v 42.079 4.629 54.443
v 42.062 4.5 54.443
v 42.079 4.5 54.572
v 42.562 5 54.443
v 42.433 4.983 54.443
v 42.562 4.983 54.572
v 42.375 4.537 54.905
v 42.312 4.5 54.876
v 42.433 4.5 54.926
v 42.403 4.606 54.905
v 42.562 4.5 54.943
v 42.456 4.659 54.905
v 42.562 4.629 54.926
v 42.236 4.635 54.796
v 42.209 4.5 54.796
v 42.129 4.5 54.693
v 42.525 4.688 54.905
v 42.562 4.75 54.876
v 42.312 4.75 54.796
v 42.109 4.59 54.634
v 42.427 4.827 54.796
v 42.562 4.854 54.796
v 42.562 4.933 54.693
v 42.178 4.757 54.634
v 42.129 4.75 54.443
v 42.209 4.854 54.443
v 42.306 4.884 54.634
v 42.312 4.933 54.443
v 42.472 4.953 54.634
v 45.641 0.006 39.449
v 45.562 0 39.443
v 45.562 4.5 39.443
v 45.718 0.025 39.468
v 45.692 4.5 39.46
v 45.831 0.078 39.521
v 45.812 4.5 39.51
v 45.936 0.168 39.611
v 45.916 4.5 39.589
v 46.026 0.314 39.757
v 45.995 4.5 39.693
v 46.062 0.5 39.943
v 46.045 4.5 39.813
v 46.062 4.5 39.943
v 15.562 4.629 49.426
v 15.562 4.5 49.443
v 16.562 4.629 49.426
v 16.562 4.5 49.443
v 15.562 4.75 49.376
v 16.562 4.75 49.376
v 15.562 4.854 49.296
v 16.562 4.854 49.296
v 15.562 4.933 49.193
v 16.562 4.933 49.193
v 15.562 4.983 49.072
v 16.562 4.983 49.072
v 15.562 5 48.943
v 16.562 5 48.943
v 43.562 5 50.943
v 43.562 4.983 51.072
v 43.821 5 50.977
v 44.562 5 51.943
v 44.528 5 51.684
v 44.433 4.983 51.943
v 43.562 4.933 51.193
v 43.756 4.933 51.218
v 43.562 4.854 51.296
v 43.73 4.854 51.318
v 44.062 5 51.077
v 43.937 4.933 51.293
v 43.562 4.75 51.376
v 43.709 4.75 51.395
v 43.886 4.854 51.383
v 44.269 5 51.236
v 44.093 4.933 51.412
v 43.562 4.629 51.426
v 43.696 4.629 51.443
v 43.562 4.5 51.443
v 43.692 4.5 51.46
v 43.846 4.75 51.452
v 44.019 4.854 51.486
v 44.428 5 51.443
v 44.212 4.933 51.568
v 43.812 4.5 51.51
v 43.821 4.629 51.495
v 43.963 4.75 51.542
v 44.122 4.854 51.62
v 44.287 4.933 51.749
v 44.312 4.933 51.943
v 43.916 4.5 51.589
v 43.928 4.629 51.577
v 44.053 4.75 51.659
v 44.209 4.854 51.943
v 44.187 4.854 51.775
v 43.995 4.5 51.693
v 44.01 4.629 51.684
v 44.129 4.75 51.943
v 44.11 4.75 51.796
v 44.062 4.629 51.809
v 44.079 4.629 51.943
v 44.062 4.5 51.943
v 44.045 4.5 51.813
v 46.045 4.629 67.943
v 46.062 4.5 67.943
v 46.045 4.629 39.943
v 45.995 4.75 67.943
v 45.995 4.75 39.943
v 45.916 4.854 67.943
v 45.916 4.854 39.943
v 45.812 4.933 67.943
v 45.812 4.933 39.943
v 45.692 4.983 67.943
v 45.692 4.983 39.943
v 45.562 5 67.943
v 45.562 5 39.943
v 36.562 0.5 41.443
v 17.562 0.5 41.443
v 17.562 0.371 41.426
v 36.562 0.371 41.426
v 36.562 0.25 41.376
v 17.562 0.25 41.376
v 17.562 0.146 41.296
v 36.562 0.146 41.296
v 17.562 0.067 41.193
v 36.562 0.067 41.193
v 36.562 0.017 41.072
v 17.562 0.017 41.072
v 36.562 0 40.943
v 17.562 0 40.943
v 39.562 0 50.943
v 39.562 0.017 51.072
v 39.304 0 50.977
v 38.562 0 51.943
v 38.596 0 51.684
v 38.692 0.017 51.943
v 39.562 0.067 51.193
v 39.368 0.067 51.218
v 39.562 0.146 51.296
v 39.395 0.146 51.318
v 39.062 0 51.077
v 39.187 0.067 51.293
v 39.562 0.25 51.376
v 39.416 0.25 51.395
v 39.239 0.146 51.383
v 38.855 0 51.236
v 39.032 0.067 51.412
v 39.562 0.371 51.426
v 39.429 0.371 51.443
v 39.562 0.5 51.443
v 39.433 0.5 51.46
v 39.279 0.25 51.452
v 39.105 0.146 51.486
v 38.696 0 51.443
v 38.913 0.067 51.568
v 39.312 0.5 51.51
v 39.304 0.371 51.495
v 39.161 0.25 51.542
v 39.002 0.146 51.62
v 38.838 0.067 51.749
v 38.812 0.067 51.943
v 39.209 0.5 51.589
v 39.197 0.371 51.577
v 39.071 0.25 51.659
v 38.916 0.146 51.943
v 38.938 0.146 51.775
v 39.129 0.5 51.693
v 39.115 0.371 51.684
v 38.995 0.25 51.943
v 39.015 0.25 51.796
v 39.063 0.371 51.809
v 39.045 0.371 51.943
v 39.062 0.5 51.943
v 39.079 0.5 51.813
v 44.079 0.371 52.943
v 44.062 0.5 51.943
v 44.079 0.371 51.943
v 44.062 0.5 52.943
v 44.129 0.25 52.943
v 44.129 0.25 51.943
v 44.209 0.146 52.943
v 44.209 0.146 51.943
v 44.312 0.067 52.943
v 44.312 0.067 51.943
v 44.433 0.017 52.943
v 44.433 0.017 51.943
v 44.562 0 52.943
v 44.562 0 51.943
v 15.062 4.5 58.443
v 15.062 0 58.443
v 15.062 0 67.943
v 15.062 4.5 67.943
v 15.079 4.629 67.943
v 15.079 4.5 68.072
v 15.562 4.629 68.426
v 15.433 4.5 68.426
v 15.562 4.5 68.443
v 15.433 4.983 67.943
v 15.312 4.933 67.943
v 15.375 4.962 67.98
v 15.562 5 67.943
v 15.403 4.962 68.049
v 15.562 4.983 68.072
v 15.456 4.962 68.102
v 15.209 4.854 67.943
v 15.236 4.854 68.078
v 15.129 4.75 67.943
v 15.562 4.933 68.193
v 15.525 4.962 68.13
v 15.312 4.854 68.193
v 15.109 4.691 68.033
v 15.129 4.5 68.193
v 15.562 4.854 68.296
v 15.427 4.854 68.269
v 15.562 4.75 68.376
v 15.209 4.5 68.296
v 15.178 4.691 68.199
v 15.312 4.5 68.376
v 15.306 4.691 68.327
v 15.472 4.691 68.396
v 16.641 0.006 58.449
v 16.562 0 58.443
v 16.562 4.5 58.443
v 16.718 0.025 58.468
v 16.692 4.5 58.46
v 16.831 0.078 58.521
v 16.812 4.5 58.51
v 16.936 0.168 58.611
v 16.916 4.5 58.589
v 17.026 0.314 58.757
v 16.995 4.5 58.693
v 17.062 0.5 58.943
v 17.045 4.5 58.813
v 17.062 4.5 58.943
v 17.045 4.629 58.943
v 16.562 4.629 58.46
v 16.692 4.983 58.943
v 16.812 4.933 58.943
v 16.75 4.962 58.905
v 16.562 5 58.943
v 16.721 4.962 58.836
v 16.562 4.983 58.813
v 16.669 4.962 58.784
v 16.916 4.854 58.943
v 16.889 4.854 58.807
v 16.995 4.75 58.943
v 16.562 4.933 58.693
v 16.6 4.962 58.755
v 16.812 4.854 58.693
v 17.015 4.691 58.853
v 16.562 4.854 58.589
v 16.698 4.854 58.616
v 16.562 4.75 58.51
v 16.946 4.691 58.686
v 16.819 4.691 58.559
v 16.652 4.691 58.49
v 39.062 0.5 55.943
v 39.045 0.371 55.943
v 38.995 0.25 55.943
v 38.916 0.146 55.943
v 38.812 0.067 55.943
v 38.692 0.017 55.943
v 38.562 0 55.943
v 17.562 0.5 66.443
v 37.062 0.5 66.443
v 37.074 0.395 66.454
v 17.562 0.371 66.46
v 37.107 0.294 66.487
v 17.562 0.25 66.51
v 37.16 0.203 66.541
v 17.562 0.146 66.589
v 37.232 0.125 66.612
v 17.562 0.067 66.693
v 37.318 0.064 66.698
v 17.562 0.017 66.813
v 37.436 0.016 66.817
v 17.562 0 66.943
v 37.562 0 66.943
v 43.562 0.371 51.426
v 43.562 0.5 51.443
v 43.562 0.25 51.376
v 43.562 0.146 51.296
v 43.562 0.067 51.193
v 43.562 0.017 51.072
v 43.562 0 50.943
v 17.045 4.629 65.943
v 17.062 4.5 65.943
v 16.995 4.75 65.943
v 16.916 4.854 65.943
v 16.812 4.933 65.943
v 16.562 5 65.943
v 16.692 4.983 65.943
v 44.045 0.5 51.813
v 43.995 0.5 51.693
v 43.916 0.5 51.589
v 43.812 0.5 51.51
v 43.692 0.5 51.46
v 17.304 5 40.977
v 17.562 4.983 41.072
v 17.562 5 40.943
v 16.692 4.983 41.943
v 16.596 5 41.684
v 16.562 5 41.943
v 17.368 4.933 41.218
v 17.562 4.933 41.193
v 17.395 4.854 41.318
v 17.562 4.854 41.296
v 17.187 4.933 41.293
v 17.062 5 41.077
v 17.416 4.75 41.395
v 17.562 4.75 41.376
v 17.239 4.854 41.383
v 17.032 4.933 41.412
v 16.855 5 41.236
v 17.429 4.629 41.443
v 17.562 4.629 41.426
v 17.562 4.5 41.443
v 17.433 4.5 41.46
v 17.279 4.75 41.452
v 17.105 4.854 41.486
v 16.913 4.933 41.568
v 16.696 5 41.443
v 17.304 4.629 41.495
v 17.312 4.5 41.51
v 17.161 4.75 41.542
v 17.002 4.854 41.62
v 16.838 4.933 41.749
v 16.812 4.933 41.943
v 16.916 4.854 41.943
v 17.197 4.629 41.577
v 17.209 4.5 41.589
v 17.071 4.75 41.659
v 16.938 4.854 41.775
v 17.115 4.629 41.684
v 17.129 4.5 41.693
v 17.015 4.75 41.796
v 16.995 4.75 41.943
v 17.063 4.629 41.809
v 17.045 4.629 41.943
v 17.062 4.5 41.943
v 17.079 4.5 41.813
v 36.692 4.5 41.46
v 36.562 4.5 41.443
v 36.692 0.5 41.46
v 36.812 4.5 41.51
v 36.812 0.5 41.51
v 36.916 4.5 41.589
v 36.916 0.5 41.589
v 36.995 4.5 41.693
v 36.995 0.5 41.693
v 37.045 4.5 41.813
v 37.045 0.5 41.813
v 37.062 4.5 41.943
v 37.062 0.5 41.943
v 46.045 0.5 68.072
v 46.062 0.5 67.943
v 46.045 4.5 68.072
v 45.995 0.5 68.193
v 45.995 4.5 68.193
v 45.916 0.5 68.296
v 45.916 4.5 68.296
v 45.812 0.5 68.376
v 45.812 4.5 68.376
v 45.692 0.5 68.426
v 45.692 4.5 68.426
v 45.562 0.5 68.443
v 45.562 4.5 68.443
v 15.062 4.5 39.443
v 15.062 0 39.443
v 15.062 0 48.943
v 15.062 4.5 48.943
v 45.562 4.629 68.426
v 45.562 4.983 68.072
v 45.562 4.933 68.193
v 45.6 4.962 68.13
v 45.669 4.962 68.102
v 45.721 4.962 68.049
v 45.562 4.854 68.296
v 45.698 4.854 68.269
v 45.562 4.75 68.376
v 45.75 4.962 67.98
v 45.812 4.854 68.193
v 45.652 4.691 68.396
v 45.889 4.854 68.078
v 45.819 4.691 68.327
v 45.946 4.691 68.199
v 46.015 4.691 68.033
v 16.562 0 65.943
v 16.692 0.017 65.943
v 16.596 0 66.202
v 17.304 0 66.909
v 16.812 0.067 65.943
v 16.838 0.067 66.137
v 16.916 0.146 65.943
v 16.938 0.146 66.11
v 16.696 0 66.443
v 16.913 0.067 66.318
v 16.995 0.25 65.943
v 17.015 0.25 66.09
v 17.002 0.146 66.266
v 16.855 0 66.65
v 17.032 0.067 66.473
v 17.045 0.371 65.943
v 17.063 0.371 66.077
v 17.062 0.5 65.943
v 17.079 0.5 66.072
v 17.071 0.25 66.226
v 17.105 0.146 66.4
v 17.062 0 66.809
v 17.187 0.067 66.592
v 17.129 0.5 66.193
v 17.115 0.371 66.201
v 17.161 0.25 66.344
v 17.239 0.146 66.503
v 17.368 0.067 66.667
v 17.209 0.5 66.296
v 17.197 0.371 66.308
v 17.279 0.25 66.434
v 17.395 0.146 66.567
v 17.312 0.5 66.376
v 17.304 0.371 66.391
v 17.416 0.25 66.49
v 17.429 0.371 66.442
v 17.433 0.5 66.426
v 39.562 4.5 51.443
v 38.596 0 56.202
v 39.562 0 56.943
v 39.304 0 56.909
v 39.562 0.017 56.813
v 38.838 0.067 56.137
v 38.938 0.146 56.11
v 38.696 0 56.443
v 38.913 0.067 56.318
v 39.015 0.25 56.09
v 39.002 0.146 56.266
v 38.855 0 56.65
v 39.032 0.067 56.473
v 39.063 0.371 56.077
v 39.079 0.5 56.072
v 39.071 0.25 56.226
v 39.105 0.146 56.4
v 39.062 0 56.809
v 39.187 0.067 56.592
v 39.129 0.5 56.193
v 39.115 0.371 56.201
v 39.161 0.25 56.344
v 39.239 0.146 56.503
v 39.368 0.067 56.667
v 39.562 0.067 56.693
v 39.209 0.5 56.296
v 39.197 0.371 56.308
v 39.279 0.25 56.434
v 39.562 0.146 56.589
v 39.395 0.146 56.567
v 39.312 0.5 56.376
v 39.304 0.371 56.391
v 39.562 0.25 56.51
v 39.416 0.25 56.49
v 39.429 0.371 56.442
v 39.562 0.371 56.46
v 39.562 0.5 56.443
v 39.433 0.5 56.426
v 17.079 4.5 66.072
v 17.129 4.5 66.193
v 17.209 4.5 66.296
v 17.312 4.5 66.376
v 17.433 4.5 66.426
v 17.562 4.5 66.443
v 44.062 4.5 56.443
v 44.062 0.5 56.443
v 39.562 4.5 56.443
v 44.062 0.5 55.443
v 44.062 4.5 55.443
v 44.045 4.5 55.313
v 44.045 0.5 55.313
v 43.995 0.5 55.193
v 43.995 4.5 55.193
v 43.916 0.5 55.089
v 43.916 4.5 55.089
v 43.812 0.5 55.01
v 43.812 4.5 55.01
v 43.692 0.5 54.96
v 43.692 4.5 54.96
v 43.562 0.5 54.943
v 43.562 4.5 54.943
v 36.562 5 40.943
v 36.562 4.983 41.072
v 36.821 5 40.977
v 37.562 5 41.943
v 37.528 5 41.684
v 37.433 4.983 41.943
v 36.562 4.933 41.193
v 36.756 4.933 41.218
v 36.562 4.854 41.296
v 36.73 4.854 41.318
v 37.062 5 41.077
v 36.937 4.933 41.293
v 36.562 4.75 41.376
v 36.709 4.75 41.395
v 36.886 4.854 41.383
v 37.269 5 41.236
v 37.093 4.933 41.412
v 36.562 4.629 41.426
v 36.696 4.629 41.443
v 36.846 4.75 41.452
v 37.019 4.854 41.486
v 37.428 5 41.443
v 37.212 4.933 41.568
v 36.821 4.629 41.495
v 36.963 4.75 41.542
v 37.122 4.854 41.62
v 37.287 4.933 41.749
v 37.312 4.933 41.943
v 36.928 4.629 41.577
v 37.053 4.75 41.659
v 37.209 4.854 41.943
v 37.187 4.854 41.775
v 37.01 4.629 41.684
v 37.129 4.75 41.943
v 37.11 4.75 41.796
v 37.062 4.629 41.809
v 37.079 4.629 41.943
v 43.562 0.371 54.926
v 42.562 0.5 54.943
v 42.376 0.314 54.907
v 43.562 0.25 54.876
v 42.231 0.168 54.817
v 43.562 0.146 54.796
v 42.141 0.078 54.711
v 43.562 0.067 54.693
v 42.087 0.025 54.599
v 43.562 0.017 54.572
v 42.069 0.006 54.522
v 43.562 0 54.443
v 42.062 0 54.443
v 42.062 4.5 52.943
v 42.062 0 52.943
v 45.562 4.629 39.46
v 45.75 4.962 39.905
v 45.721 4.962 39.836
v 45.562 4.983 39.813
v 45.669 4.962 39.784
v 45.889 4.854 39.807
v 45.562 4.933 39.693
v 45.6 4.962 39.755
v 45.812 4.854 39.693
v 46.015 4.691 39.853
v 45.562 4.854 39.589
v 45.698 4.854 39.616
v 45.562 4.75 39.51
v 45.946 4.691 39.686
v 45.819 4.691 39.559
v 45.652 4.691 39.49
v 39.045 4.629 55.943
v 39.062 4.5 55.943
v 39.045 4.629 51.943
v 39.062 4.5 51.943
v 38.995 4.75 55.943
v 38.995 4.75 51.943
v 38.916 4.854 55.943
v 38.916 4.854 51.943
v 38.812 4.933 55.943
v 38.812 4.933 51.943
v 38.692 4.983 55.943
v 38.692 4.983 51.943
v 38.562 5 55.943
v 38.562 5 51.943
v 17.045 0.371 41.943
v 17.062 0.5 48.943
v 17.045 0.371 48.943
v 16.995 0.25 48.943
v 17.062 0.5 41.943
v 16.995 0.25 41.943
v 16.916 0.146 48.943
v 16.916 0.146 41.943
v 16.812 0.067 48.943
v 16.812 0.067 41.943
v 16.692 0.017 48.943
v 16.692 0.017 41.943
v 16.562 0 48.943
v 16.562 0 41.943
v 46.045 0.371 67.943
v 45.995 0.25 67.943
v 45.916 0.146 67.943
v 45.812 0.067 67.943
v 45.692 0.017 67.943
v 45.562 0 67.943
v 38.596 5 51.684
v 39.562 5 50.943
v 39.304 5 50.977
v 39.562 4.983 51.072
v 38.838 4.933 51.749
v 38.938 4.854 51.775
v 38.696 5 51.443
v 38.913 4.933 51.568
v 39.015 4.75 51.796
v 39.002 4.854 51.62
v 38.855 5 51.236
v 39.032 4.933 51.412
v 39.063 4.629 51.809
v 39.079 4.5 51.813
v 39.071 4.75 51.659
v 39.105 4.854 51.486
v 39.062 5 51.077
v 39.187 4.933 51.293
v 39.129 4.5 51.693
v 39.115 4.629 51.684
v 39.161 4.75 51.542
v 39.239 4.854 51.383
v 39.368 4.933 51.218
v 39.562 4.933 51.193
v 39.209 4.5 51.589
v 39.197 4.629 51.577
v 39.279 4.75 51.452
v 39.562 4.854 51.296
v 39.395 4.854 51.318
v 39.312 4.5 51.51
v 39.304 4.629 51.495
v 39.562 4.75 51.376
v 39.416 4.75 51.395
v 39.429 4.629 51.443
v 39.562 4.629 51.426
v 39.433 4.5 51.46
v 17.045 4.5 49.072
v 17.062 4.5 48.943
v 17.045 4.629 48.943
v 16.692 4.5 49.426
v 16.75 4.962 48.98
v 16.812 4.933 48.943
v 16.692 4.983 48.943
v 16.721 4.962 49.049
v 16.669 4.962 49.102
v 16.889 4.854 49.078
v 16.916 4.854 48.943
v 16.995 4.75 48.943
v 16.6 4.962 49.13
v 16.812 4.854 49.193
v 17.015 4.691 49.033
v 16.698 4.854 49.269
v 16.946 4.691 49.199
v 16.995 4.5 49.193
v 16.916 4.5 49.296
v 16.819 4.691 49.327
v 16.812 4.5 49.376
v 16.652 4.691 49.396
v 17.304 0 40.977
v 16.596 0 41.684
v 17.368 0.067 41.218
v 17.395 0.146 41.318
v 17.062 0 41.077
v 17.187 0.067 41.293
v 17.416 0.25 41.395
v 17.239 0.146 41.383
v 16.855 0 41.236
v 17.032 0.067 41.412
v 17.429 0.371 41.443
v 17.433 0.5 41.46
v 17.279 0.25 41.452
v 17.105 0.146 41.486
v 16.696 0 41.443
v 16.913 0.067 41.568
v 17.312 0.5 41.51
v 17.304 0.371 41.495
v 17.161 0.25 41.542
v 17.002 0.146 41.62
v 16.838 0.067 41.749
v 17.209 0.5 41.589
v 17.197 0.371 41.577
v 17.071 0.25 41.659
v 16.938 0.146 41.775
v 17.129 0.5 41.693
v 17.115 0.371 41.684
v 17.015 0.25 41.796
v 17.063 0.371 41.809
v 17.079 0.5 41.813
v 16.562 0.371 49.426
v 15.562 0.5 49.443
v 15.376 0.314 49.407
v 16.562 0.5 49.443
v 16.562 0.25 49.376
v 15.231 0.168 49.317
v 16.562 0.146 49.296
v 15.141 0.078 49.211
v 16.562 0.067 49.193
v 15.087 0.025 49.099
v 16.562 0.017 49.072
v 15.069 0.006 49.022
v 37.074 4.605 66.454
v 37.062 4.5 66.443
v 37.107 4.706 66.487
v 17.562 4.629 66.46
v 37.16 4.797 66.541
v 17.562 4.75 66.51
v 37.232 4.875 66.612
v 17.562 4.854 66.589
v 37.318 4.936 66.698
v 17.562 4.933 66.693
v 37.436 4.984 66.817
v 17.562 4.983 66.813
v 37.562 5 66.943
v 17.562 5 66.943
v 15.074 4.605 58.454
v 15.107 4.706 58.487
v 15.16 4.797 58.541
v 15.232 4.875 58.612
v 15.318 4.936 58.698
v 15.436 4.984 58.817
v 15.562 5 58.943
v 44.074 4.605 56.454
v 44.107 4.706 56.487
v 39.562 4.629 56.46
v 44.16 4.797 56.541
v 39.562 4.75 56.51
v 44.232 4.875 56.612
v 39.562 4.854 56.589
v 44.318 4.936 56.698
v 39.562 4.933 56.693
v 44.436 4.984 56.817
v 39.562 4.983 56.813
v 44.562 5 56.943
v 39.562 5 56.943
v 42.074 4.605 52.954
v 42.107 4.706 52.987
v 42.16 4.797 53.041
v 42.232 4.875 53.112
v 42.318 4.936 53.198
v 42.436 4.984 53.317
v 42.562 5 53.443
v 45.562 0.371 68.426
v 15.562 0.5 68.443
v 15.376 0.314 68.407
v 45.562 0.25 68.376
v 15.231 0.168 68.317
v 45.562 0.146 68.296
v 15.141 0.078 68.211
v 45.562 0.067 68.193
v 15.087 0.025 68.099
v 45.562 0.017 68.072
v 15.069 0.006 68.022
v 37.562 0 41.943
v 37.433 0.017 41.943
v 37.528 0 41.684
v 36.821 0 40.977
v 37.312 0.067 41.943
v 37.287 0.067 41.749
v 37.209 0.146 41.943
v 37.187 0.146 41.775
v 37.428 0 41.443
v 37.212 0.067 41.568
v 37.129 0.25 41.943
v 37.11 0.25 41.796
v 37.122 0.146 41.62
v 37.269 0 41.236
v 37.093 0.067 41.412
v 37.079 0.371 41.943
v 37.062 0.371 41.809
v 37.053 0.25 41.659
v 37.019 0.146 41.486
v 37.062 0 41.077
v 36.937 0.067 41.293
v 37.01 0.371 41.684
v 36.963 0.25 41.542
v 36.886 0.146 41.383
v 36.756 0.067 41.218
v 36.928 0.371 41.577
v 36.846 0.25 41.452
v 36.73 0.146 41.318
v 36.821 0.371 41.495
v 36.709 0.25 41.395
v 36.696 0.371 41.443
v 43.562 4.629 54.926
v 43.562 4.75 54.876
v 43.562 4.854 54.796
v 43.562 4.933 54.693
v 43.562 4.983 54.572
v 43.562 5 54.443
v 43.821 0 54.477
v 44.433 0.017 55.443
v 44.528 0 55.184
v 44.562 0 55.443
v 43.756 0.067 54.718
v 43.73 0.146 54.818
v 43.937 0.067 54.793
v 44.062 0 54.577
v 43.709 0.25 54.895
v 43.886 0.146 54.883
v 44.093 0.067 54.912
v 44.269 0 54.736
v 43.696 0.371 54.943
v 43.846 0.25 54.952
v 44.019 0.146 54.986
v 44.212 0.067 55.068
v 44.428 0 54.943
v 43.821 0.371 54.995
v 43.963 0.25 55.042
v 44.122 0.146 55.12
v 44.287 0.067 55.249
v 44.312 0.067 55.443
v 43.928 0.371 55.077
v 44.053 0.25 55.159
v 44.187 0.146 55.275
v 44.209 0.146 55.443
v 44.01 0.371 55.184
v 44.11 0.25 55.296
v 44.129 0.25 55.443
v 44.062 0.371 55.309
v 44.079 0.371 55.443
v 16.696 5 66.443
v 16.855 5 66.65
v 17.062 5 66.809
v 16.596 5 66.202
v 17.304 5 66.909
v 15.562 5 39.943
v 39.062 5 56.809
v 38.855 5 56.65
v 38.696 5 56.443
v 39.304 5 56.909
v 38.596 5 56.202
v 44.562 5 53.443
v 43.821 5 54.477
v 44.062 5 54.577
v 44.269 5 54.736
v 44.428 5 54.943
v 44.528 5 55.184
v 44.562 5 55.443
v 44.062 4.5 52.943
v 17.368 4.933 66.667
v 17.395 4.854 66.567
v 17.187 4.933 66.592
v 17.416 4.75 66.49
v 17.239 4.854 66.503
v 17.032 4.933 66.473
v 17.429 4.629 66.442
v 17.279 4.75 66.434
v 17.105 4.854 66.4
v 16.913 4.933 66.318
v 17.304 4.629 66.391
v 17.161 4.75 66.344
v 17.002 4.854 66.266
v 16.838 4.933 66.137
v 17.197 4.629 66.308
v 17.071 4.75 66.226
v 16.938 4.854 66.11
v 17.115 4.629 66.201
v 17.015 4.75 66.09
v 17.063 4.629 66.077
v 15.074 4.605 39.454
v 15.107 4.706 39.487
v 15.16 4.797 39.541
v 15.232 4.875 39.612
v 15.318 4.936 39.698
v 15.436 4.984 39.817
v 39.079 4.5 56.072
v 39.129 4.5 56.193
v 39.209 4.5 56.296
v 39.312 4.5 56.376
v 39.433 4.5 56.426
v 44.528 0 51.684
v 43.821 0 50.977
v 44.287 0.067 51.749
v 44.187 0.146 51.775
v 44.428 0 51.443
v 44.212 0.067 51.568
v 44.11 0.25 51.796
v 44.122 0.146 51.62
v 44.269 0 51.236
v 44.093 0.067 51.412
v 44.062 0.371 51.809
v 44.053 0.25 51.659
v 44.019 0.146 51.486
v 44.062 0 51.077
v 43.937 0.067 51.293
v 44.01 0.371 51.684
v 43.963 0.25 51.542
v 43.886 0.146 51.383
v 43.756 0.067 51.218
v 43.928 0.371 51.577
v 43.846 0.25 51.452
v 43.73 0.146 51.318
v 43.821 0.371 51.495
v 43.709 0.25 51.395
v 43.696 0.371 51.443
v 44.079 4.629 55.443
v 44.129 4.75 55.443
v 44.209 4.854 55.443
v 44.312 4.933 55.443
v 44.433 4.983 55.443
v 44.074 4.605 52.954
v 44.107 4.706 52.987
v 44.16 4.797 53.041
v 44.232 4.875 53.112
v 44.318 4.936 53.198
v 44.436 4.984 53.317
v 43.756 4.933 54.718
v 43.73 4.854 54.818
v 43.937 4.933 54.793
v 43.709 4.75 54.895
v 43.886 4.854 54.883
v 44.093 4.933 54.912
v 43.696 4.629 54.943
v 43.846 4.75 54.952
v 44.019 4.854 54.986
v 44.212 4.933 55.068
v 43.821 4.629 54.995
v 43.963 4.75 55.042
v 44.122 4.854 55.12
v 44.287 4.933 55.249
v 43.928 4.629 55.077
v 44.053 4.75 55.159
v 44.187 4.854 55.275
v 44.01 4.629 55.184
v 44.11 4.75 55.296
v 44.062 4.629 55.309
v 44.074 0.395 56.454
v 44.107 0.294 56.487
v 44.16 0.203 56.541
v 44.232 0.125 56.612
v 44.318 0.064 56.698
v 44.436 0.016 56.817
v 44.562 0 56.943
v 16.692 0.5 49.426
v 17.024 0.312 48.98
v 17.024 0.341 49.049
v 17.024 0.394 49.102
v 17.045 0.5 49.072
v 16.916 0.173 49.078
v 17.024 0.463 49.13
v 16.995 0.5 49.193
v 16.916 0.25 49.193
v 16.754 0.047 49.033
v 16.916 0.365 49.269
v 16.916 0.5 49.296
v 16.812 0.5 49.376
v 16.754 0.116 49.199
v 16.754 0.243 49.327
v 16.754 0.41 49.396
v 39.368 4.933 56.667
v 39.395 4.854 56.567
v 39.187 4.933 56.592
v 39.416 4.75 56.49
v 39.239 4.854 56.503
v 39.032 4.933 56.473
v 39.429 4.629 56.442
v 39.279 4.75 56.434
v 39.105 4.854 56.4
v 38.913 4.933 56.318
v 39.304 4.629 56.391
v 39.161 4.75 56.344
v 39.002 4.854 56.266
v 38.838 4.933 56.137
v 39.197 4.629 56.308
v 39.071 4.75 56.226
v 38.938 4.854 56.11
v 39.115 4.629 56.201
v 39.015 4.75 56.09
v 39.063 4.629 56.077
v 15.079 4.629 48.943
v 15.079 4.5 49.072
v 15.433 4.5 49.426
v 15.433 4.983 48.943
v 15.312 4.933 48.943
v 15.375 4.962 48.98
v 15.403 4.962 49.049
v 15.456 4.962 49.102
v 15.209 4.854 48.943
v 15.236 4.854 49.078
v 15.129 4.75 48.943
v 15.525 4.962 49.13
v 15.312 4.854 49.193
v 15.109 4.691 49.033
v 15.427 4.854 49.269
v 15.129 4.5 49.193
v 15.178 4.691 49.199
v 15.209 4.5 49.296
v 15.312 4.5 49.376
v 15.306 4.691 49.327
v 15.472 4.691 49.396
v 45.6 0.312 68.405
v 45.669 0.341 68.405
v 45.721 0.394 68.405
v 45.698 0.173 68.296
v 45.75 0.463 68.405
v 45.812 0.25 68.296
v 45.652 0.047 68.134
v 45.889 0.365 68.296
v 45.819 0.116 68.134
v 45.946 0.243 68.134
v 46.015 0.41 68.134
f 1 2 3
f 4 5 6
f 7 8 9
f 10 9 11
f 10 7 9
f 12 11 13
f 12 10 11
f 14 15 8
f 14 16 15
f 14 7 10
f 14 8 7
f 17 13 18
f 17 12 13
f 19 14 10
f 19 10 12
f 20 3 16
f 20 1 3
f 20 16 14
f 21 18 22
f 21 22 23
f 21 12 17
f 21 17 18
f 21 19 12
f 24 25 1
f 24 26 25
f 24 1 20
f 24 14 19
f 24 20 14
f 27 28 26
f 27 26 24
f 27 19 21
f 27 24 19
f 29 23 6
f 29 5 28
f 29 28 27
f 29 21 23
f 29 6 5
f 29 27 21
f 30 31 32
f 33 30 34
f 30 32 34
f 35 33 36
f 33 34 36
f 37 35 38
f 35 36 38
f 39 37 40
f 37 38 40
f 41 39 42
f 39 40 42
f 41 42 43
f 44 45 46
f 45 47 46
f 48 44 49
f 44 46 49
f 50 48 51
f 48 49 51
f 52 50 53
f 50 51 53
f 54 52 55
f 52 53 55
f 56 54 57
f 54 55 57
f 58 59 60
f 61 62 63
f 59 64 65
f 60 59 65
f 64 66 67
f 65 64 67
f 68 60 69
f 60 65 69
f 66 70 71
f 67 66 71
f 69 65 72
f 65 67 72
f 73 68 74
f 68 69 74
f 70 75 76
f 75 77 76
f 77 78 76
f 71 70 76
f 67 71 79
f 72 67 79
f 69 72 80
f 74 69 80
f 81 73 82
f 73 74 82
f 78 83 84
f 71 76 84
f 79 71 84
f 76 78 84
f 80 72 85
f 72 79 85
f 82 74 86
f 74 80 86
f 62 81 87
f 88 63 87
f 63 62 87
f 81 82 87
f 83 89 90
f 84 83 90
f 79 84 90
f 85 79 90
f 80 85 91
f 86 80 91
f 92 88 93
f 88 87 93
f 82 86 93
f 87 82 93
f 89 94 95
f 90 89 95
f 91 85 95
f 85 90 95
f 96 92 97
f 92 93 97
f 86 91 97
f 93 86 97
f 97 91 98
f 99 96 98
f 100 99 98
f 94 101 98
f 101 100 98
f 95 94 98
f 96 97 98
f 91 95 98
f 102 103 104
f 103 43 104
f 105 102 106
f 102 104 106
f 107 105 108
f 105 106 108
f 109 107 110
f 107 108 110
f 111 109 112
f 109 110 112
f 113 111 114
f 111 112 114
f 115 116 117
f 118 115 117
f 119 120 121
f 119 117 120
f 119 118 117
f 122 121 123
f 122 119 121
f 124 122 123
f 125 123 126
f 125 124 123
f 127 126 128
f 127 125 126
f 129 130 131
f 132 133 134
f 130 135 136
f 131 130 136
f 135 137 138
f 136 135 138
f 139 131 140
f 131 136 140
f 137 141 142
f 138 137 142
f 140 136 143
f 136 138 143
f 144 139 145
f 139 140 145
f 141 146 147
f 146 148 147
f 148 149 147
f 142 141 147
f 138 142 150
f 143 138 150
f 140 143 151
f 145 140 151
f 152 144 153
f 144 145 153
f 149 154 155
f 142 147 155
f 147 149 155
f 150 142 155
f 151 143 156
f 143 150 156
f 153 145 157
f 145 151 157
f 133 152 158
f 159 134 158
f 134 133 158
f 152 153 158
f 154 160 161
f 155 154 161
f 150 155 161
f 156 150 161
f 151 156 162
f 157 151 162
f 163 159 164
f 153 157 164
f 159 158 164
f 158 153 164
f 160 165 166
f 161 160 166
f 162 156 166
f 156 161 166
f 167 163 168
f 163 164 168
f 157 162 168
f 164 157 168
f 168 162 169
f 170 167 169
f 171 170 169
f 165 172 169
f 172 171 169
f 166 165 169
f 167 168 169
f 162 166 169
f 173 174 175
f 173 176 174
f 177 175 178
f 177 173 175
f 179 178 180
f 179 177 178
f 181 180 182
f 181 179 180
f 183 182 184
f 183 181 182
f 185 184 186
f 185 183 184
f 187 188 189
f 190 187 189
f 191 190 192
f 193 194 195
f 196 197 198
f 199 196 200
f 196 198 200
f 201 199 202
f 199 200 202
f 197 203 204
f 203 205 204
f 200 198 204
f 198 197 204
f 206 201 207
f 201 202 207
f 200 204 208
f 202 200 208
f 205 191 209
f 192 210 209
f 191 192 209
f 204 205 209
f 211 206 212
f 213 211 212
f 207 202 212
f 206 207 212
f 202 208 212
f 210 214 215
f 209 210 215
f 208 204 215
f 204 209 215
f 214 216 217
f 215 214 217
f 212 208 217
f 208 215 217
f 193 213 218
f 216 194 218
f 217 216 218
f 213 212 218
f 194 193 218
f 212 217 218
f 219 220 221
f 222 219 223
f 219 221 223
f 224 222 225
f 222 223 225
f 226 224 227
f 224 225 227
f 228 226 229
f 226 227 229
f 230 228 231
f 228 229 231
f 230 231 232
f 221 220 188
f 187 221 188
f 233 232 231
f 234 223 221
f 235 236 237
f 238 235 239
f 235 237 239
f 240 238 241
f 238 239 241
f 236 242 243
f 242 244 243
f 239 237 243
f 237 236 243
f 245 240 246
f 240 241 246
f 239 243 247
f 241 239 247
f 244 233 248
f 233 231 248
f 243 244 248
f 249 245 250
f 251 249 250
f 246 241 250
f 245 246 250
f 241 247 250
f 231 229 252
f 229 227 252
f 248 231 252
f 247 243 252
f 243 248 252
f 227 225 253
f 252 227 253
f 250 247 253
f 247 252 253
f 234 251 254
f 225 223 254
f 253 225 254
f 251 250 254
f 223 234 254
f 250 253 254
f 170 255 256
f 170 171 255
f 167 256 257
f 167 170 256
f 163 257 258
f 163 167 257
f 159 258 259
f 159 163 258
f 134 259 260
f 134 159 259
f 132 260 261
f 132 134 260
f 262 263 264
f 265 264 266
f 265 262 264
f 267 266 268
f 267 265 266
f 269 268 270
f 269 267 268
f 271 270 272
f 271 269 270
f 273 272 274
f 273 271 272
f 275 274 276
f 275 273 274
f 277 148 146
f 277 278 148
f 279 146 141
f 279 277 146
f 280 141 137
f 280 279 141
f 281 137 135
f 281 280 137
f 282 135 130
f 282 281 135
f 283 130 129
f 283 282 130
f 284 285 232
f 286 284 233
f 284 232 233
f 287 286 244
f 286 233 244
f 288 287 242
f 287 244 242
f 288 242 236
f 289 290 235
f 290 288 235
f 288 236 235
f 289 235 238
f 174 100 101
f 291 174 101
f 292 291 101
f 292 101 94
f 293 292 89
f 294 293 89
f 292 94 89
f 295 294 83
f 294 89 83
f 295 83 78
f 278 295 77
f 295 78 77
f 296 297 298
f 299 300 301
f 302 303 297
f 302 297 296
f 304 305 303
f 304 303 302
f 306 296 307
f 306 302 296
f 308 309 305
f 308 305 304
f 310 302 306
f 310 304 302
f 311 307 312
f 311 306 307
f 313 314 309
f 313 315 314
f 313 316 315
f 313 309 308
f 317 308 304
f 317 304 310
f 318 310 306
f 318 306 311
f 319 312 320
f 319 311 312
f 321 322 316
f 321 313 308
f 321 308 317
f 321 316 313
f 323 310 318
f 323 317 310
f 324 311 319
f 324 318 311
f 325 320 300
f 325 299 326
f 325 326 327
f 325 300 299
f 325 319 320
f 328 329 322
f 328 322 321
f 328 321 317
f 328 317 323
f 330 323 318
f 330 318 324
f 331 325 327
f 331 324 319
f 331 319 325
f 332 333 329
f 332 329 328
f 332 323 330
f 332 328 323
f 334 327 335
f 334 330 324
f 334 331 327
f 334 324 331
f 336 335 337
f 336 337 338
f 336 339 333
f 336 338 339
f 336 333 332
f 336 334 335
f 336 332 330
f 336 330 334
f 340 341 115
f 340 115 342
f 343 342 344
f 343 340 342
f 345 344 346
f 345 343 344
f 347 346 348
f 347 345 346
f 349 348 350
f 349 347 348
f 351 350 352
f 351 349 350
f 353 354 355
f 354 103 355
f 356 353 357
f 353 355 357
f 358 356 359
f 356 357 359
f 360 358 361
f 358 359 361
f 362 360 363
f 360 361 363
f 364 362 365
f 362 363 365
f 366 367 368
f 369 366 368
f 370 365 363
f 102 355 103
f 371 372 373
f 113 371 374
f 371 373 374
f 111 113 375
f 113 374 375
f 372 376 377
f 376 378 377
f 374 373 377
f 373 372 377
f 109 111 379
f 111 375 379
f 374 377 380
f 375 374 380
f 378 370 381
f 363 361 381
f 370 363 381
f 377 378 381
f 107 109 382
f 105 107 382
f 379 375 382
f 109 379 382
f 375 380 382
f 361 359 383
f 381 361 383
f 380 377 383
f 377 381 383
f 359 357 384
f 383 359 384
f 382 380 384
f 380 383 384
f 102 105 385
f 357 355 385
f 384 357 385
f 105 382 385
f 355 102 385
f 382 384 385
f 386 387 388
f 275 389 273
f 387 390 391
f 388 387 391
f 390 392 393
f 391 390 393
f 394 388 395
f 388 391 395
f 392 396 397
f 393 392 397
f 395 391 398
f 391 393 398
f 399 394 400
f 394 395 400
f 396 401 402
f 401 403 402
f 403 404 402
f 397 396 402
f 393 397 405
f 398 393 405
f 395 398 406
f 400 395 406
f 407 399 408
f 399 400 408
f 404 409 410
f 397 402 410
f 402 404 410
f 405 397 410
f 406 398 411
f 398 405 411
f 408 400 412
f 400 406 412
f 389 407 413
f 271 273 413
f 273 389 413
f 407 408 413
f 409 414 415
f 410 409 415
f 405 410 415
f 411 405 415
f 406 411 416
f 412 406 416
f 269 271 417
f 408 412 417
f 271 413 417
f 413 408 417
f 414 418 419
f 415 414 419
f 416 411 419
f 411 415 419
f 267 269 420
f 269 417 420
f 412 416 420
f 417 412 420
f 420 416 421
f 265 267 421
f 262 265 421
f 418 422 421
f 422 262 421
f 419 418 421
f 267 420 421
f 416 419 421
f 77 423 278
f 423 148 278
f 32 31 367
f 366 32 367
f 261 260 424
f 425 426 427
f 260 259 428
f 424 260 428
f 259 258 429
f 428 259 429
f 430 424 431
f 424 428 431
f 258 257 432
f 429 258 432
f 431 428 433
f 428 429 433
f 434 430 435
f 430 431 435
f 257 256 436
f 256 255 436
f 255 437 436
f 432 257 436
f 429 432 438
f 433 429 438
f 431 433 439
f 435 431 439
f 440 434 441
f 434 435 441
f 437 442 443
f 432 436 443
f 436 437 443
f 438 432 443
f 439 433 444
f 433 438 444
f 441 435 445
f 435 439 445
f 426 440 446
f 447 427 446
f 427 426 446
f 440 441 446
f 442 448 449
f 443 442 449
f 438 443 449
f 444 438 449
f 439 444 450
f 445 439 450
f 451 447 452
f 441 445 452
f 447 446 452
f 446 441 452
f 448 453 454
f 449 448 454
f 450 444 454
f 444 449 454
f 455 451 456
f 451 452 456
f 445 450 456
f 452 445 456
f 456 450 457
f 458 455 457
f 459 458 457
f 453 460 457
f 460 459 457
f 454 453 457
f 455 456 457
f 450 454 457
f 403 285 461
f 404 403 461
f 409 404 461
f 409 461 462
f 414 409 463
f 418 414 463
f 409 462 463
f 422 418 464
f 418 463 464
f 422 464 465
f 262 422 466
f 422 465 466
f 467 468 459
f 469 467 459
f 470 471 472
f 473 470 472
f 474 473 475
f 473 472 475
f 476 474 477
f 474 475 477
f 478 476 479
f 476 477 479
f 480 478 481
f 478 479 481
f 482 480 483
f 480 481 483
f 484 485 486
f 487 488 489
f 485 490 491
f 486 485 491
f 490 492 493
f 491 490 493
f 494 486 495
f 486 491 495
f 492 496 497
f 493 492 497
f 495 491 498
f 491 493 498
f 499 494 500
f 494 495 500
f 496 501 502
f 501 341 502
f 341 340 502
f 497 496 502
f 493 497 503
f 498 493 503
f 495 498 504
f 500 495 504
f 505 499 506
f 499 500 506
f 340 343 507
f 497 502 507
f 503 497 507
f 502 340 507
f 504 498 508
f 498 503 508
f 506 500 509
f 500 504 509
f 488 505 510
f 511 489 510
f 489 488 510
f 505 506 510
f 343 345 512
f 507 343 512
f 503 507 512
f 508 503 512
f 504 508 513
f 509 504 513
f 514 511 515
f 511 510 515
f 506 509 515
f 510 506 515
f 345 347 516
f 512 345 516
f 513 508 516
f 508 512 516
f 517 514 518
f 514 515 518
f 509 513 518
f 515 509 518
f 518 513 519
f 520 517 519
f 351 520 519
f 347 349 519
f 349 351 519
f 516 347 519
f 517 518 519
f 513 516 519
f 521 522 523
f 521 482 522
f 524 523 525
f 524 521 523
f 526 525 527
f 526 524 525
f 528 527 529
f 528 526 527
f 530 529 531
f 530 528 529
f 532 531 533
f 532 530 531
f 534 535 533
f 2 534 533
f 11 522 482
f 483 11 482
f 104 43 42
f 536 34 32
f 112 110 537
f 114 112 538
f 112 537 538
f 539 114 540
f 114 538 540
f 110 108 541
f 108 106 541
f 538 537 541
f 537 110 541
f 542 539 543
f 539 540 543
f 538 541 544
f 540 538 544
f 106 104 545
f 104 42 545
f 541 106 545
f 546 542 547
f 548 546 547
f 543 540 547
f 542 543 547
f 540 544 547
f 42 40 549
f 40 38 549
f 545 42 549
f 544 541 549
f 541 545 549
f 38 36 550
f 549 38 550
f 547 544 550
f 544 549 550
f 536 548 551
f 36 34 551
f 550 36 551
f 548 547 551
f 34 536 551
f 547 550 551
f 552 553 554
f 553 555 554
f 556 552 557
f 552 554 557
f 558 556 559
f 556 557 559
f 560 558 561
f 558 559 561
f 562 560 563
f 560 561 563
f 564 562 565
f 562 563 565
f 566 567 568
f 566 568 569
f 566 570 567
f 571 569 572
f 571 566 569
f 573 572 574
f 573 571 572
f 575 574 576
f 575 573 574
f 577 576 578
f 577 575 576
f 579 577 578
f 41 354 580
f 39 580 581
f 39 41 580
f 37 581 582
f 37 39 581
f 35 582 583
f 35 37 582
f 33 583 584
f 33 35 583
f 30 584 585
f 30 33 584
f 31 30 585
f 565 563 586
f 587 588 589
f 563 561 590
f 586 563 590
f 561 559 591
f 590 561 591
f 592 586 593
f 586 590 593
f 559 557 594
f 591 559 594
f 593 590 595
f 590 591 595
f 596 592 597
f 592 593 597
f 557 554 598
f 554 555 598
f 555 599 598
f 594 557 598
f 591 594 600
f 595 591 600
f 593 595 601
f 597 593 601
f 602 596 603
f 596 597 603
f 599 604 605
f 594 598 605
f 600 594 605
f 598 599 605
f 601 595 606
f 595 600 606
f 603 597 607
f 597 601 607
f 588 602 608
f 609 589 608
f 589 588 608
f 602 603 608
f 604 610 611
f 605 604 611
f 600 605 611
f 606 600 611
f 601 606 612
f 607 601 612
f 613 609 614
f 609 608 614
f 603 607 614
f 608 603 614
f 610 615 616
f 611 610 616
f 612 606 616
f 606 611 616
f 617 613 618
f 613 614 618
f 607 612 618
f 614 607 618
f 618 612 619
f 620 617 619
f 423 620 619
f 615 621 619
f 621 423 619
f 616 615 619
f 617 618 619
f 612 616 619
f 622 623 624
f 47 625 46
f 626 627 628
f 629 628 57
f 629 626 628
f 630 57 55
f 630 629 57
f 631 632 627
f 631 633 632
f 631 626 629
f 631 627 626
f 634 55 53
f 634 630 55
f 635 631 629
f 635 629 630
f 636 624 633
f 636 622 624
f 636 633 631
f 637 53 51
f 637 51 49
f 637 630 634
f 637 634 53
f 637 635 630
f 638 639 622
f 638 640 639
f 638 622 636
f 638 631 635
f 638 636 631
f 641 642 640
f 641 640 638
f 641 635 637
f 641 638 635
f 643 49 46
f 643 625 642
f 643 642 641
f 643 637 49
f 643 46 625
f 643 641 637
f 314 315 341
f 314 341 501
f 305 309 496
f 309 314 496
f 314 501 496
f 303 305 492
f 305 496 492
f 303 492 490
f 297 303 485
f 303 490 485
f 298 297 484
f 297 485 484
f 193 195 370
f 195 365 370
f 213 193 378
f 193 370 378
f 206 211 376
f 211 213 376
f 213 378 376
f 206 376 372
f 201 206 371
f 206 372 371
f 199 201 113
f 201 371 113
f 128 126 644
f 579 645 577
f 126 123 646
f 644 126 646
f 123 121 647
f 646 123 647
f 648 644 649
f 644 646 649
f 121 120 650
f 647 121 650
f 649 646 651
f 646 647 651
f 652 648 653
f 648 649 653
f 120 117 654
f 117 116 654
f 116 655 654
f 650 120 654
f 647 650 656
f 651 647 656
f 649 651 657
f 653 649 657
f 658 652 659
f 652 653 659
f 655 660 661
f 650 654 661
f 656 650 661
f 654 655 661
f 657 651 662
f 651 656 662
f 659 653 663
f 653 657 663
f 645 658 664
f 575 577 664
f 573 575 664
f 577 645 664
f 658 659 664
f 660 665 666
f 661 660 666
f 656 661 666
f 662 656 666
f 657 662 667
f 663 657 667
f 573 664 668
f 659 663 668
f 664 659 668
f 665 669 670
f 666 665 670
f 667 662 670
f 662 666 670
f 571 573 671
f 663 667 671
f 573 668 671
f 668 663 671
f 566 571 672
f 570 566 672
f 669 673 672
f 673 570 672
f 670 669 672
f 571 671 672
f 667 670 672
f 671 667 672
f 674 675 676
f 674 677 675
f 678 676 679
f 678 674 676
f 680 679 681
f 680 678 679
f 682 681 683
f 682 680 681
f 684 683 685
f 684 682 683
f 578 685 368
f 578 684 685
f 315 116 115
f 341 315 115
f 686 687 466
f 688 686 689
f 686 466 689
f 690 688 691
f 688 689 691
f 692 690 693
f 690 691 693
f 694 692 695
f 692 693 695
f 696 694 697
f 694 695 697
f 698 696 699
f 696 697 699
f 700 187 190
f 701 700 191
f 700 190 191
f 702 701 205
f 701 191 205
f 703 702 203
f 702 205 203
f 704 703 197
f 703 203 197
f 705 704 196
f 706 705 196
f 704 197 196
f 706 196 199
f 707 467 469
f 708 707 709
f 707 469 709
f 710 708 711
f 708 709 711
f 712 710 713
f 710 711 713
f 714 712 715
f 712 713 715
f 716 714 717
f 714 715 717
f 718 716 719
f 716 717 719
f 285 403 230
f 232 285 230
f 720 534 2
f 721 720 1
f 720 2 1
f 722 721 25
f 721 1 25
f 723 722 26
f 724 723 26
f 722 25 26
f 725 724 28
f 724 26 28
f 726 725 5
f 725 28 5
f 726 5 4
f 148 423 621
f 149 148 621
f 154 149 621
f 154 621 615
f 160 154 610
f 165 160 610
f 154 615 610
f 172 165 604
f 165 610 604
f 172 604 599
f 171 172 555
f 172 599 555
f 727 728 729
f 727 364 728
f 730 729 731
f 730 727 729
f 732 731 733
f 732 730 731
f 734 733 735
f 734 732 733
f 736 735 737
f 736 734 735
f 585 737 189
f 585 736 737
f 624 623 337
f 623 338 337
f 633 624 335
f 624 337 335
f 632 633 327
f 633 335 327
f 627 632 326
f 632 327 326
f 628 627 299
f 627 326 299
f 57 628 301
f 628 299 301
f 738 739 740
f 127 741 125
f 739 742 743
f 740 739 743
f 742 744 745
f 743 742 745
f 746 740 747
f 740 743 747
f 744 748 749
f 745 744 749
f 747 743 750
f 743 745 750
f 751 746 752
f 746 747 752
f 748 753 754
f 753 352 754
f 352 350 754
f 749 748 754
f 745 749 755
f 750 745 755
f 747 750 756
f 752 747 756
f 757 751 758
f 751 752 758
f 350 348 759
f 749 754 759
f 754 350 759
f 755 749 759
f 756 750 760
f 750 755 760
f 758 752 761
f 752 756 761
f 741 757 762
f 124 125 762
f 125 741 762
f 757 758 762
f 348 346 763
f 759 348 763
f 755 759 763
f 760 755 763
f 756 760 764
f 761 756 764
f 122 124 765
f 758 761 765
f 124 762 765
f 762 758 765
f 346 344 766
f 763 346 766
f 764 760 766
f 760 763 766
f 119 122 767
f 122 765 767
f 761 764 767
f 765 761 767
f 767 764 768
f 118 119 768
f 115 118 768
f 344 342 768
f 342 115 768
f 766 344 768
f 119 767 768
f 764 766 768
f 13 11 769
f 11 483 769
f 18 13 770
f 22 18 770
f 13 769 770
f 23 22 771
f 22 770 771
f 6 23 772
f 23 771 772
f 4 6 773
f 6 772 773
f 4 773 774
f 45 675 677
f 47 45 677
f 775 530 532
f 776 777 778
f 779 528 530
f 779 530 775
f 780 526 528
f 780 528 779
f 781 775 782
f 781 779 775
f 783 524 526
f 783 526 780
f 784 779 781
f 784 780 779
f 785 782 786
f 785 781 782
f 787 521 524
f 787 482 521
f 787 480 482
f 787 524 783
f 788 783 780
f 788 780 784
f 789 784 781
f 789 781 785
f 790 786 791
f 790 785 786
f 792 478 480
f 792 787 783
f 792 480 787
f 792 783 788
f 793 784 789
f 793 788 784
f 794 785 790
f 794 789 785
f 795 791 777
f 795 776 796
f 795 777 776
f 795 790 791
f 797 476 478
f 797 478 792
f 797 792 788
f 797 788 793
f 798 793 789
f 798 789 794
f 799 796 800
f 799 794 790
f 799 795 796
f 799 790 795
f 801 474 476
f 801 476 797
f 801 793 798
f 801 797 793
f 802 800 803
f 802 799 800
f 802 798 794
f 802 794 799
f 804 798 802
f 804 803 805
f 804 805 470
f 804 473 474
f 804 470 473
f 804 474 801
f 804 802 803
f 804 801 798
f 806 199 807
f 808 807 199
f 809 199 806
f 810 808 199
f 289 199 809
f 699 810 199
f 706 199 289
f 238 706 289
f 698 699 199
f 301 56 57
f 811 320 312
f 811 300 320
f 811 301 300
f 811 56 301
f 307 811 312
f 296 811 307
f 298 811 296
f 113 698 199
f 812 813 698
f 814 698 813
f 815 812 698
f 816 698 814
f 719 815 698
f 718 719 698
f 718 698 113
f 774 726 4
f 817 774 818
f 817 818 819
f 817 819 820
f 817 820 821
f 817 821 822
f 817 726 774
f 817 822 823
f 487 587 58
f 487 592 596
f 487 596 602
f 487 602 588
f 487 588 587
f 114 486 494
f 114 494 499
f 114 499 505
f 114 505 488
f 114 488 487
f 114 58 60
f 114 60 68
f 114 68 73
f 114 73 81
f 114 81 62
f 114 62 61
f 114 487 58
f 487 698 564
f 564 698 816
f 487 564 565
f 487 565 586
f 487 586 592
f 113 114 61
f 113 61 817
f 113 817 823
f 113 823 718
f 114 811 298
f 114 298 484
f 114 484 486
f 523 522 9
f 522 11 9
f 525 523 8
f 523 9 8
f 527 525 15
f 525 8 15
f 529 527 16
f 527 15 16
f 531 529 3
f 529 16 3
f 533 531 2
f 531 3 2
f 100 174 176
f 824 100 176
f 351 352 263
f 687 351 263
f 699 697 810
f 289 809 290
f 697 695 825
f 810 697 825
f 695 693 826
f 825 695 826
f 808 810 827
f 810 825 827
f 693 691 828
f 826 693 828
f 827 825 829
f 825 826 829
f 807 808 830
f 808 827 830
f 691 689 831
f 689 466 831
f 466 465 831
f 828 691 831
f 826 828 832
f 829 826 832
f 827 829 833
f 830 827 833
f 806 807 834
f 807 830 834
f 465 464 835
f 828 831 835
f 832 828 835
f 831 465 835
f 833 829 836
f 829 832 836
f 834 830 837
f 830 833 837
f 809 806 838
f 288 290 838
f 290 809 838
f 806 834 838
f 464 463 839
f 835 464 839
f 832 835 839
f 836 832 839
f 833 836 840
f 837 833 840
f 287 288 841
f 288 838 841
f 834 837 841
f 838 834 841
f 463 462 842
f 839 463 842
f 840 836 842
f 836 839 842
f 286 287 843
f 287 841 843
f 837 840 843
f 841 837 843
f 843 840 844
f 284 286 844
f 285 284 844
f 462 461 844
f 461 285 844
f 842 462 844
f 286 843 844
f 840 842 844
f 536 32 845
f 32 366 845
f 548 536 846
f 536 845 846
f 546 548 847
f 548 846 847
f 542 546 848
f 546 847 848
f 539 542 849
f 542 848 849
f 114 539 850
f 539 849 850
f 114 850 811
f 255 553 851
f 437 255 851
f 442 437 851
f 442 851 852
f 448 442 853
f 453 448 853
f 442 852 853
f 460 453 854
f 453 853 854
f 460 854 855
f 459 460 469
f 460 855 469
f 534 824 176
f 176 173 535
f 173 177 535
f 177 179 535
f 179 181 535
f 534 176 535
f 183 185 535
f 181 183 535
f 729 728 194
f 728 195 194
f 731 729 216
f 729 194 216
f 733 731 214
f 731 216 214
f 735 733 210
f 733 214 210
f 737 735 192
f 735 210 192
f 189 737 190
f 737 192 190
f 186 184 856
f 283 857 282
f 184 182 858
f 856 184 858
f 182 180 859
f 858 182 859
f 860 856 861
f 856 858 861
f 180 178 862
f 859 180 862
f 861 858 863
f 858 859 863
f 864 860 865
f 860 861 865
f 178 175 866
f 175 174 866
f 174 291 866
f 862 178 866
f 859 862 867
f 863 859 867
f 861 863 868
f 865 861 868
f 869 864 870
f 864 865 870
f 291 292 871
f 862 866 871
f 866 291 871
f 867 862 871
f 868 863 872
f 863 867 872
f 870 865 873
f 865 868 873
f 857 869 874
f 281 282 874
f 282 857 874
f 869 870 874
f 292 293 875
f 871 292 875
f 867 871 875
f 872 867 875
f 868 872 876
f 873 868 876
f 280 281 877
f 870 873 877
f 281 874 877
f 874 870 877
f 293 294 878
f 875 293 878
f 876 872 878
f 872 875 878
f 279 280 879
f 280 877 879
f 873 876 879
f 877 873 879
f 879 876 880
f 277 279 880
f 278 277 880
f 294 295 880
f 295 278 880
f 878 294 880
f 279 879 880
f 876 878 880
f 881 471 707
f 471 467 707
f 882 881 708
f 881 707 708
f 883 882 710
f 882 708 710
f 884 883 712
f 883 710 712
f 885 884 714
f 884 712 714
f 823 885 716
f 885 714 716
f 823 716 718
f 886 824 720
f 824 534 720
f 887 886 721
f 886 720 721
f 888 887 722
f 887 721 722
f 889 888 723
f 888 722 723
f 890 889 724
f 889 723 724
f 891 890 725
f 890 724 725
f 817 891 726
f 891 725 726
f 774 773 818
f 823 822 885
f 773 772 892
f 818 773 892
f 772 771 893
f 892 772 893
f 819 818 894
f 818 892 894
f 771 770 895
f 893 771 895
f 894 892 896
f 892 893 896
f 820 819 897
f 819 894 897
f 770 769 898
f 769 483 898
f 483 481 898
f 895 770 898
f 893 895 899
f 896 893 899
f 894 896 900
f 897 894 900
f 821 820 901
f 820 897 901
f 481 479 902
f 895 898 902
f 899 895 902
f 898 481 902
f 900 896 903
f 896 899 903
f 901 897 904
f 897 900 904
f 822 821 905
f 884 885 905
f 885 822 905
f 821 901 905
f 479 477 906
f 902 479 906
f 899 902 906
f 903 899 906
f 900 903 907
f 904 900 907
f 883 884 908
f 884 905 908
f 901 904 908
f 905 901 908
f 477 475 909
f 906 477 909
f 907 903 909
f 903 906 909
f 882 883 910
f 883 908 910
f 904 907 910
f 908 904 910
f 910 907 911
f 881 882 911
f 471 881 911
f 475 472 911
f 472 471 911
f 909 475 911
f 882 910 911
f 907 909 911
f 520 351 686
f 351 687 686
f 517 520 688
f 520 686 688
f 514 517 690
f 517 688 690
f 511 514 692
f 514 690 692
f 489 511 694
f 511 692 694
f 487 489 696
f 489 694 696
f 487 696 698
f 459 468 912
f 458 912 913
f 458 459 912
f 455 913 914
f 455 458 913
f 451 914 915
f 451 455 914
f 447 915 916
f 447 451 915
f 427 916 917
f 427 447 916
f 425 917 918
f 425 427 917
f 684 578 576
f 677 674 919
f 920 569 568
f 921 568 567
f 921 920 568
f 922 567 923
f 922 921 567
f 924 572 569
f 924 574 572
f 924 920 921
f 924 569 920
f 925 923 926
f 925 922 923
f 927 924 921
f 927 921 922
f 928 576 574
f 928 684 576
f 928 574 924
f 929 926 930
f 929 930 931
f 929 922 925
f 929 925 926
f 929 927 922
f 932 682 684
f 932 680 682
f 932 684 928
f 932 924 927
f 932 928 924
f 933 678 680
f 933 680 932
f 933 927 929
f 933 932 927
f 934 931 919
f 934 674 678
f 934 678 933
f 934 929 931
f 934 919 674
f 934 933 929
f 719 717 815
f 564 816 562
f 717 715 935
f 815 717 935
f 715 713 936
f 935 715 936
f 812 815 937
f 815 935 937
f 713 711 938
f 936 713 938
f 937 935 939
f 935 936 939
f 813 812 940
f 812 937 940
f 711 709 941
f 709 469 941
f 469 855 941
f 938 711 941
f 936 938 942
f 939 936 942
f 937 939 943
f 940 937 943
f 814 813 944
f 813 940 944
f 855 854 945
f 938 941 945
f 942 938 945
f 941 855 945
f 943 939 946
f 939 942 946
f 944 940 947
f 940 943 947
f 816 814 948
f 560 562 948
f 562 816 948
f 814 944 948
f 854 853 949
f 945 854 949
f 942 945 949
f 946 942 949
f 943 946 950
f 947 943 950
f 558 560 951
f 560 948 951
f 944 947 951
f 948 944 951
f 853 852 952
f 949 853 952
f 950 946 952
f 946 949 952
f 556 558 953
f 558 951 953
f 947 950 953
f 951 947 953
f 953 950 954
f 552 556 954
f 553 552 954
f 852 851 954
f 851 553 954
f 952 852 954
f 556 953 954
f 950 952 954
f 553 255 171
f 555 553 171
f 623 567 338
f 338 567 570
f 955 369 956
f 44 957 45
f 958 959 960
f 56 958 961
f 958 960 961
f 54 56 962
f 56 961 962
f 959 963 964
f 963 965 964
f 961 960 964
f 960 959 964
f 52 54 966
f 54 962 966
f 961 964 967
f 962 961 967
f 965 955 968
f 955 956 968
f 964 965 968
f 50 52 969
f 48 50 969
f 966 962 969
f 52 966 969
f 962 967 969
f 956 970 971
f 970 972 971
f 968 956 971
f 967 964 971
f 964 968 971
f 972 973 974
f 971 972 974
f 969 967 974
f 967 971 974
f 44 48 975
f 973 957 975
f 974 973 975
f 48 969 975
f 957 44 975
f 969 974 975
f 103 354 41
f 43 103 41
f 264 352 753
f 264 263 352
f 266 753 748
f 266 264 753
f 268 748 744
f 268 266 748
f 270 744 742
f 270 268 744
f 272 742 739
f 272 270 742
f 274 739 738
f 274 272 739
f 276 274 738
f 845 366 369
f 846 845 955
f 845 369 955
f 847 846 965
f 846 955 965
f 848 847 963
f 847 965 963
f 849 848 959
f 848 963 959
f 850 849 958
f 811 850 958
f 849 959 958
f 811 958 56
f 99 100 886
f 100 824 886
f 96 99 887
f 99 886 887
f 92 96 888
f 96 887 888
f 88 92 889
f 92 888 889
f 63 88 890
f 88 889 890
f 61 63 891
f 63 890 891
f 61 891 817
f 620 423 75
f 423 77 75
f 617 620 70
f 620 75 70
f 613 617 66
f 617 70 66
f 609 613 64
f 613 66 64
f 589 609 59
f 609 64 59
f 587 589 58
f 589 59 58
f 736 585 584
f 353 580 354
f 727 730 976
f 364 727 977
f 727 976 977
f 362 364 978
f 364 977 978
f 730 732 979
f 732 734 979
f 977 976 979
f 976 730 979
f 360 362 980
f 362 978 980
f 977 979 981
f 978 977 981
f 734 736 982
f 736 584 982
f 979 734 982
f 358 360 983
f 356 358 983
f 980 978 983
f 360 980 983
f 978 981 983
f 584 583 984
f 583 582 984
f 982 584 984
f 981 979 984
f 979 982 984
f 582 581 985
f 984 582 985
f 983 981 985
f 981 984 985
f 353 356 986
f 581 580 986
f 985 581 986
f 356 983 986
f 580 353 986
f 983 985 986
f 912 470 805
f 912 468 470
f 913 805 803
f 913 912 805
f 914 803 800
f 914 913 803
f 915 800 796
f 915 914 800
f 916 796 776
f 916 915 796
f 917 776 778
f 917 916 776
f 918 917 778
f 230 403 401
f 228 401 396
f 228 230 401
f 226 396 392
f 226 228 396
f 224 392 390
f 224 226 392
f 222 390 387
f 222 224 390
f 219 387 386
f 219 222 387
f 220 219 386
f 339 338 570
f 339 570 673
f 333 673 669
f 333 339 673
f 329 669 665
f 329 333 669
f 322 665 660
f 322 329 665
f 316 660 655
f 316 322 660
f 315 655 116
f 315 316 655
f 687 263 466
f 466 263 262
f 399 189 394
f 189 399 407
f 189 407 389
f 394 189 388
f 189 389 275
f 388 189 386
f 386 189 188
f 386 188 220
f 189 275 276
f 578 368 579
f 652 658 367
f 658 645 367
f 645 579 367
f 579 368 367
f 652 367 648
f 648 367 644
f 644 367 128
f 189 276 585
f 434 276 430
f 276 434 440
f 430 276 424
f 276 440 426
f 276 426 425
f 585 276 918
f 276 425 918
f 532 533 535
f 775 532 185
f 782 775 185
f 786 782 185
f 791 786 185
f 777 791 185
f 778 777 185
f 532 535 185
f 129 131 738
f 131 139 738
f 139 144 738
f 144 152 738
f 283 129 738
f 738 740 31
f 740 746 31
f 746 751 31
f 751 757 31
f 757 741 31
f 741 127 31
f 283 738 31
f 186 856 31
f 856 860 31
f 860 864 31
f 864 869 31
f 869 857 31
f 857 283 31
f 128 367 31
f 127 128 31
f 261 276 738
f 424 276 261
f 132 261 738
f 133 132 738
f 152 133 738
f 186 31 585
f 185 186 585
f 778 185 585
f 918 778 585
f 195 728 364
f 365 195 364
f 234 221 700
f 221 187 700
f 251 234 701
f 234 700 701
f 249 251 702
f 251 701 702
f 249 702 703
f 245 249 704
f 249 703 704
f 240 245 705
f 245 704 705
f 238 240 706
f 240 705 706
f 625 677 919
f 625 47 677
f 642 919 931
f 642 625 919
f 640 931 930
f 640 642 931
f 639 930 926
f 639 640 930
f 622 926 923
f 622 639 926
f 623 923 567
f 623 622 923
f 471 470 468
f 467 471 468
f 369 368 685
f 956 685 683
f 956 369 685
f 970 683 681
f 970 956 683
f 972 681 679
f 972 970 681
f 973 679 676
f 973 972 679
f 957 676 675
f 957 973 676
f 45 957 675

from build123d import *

# Parameters (mm, degrees)
BOSS_EXTRUDE2_DEPTH = 5
FILLET1_R           = 0.5


with BuildPart() as part:
    # Sketch1 → Boss-Extrude2 (new body)
    with BuildSketch(Plane(origin=(0, 0, 0), x_dir=(1, 0, 0), z_dir=(0, 1, 0))):
        Polygon((46.062322946, -39.44276686), (15.062322946, -39.44276686), (15.062322946, -49.44276686), (17.062322946, -49.44276686), (17.062322946, -41.44276686), (37.062322946, -41.44276686), (37.062322946, -66.44276686), (17.062322946, -66.44276686), (17.062322946, -58.44276686), (15.062322946, -58.44276686), (15.062322946, -68.44276686), (46.062322946, -68.44276686), align=None)
        Polygon((44.062322946, -56.44276686), (39.062322946, -56.44276686), (39.062322946, -51.44276686), (44.062322946, -51.44276686), (44.062322946, -52.94276686), (42.062322946, -52.94276686), (42.062322946, -54.94276686), (44.062322946, -54.94276686), align=None, mode=Mode.SUBTRACT)
    extrude(amount=BOSS_EXTRUDE2_DEPTH)

    # Fillet1
    fillet1_edges = [part.edges().sort_by_distance(p)[0] for p in [
        (41.562322946, 5, 51.44276686),
        (44.062322946, 5, 52.19276686),
        (16.062322946, 0, 49.44276686),
        (43.062322946, 5, 52.94276686),
        (46.062322946, 0, 53.94276686),
        (30.562322946, 0, 68.44276686),
        (17.062322946, 0, 62.44276686),
        (27.062322946, 0, 66.44276686),
        (37.062322946, 0, 53.94276686),
        (42.062322946, 5, 53.94276686),
        (27.062322946, 0, 41.44276686),
        (17.062322946, 0, 45.44276686),
        (44.062322946, 0, 52.19276686),
        (41.562322946, 0, 51.44276686),
        (39.062322946, 0, 53.94276686),
        (41.562322946, 0, 56.44276686),
        (17.062322946, 2.5, 49.44276686),
        (15.062322946, 2.5, 49.44276686),
        (46.062322946, 2.5, 39.44276686),
        (46.062322946, 2.5, 68.44276686),
        (15.062322946, 2.5, 68.44276686),
        (17.062322946, 2.5, 58.44276686),
        (17.062322946, 2.5, 66.44276686),
        (37.062322946, 2.5, 41.44276686),
        (17.062322946, 5, 45.44276686),
        (17.062322946, 2.5, 41.44276686),
        (44.062322946, 2.5, 51.44276686),
        (39.062322946, 2.5, 51.44276686),
        (39.062322946, 2.5, 56.44276686),
        (27.062322946, 5, 41.44276686),
        (37.062322946, 5, 53.94276686),
        (41.562322946, 5, 56.44276686),
        (27.062322946, 5, 66.44276686),
        (44.062322946, 0, 55.69276686),
        (44.062322946, 5, 55.69276686),
        (17.062322946, 5, 62.44276686),
        (44.062322946, 2.5, 54.94276686),
        (16.062322946, 5, 58.44276686),
        (15.062322946, 5, 63.44276686),
        (42.062322946, 2.5, 54.94276686),
        (43.062322946, 5, 54.94276686),
        (43.062322946, 0, 54.94276686),
        (30.562322946, 5, 68.44276686),
        (46.062322946, 5, 53.94276686),
        (30.562322946, 5, 39.44276686),
        (39.062322946, 5, 53.94276686),
        (15.062322946, 5, 44.44276686),
        (16.062322946, 5, 49.44276686),
    ]]
    fillet(fillet1_edges, radius=FILLET1_R)


solid = part.part
